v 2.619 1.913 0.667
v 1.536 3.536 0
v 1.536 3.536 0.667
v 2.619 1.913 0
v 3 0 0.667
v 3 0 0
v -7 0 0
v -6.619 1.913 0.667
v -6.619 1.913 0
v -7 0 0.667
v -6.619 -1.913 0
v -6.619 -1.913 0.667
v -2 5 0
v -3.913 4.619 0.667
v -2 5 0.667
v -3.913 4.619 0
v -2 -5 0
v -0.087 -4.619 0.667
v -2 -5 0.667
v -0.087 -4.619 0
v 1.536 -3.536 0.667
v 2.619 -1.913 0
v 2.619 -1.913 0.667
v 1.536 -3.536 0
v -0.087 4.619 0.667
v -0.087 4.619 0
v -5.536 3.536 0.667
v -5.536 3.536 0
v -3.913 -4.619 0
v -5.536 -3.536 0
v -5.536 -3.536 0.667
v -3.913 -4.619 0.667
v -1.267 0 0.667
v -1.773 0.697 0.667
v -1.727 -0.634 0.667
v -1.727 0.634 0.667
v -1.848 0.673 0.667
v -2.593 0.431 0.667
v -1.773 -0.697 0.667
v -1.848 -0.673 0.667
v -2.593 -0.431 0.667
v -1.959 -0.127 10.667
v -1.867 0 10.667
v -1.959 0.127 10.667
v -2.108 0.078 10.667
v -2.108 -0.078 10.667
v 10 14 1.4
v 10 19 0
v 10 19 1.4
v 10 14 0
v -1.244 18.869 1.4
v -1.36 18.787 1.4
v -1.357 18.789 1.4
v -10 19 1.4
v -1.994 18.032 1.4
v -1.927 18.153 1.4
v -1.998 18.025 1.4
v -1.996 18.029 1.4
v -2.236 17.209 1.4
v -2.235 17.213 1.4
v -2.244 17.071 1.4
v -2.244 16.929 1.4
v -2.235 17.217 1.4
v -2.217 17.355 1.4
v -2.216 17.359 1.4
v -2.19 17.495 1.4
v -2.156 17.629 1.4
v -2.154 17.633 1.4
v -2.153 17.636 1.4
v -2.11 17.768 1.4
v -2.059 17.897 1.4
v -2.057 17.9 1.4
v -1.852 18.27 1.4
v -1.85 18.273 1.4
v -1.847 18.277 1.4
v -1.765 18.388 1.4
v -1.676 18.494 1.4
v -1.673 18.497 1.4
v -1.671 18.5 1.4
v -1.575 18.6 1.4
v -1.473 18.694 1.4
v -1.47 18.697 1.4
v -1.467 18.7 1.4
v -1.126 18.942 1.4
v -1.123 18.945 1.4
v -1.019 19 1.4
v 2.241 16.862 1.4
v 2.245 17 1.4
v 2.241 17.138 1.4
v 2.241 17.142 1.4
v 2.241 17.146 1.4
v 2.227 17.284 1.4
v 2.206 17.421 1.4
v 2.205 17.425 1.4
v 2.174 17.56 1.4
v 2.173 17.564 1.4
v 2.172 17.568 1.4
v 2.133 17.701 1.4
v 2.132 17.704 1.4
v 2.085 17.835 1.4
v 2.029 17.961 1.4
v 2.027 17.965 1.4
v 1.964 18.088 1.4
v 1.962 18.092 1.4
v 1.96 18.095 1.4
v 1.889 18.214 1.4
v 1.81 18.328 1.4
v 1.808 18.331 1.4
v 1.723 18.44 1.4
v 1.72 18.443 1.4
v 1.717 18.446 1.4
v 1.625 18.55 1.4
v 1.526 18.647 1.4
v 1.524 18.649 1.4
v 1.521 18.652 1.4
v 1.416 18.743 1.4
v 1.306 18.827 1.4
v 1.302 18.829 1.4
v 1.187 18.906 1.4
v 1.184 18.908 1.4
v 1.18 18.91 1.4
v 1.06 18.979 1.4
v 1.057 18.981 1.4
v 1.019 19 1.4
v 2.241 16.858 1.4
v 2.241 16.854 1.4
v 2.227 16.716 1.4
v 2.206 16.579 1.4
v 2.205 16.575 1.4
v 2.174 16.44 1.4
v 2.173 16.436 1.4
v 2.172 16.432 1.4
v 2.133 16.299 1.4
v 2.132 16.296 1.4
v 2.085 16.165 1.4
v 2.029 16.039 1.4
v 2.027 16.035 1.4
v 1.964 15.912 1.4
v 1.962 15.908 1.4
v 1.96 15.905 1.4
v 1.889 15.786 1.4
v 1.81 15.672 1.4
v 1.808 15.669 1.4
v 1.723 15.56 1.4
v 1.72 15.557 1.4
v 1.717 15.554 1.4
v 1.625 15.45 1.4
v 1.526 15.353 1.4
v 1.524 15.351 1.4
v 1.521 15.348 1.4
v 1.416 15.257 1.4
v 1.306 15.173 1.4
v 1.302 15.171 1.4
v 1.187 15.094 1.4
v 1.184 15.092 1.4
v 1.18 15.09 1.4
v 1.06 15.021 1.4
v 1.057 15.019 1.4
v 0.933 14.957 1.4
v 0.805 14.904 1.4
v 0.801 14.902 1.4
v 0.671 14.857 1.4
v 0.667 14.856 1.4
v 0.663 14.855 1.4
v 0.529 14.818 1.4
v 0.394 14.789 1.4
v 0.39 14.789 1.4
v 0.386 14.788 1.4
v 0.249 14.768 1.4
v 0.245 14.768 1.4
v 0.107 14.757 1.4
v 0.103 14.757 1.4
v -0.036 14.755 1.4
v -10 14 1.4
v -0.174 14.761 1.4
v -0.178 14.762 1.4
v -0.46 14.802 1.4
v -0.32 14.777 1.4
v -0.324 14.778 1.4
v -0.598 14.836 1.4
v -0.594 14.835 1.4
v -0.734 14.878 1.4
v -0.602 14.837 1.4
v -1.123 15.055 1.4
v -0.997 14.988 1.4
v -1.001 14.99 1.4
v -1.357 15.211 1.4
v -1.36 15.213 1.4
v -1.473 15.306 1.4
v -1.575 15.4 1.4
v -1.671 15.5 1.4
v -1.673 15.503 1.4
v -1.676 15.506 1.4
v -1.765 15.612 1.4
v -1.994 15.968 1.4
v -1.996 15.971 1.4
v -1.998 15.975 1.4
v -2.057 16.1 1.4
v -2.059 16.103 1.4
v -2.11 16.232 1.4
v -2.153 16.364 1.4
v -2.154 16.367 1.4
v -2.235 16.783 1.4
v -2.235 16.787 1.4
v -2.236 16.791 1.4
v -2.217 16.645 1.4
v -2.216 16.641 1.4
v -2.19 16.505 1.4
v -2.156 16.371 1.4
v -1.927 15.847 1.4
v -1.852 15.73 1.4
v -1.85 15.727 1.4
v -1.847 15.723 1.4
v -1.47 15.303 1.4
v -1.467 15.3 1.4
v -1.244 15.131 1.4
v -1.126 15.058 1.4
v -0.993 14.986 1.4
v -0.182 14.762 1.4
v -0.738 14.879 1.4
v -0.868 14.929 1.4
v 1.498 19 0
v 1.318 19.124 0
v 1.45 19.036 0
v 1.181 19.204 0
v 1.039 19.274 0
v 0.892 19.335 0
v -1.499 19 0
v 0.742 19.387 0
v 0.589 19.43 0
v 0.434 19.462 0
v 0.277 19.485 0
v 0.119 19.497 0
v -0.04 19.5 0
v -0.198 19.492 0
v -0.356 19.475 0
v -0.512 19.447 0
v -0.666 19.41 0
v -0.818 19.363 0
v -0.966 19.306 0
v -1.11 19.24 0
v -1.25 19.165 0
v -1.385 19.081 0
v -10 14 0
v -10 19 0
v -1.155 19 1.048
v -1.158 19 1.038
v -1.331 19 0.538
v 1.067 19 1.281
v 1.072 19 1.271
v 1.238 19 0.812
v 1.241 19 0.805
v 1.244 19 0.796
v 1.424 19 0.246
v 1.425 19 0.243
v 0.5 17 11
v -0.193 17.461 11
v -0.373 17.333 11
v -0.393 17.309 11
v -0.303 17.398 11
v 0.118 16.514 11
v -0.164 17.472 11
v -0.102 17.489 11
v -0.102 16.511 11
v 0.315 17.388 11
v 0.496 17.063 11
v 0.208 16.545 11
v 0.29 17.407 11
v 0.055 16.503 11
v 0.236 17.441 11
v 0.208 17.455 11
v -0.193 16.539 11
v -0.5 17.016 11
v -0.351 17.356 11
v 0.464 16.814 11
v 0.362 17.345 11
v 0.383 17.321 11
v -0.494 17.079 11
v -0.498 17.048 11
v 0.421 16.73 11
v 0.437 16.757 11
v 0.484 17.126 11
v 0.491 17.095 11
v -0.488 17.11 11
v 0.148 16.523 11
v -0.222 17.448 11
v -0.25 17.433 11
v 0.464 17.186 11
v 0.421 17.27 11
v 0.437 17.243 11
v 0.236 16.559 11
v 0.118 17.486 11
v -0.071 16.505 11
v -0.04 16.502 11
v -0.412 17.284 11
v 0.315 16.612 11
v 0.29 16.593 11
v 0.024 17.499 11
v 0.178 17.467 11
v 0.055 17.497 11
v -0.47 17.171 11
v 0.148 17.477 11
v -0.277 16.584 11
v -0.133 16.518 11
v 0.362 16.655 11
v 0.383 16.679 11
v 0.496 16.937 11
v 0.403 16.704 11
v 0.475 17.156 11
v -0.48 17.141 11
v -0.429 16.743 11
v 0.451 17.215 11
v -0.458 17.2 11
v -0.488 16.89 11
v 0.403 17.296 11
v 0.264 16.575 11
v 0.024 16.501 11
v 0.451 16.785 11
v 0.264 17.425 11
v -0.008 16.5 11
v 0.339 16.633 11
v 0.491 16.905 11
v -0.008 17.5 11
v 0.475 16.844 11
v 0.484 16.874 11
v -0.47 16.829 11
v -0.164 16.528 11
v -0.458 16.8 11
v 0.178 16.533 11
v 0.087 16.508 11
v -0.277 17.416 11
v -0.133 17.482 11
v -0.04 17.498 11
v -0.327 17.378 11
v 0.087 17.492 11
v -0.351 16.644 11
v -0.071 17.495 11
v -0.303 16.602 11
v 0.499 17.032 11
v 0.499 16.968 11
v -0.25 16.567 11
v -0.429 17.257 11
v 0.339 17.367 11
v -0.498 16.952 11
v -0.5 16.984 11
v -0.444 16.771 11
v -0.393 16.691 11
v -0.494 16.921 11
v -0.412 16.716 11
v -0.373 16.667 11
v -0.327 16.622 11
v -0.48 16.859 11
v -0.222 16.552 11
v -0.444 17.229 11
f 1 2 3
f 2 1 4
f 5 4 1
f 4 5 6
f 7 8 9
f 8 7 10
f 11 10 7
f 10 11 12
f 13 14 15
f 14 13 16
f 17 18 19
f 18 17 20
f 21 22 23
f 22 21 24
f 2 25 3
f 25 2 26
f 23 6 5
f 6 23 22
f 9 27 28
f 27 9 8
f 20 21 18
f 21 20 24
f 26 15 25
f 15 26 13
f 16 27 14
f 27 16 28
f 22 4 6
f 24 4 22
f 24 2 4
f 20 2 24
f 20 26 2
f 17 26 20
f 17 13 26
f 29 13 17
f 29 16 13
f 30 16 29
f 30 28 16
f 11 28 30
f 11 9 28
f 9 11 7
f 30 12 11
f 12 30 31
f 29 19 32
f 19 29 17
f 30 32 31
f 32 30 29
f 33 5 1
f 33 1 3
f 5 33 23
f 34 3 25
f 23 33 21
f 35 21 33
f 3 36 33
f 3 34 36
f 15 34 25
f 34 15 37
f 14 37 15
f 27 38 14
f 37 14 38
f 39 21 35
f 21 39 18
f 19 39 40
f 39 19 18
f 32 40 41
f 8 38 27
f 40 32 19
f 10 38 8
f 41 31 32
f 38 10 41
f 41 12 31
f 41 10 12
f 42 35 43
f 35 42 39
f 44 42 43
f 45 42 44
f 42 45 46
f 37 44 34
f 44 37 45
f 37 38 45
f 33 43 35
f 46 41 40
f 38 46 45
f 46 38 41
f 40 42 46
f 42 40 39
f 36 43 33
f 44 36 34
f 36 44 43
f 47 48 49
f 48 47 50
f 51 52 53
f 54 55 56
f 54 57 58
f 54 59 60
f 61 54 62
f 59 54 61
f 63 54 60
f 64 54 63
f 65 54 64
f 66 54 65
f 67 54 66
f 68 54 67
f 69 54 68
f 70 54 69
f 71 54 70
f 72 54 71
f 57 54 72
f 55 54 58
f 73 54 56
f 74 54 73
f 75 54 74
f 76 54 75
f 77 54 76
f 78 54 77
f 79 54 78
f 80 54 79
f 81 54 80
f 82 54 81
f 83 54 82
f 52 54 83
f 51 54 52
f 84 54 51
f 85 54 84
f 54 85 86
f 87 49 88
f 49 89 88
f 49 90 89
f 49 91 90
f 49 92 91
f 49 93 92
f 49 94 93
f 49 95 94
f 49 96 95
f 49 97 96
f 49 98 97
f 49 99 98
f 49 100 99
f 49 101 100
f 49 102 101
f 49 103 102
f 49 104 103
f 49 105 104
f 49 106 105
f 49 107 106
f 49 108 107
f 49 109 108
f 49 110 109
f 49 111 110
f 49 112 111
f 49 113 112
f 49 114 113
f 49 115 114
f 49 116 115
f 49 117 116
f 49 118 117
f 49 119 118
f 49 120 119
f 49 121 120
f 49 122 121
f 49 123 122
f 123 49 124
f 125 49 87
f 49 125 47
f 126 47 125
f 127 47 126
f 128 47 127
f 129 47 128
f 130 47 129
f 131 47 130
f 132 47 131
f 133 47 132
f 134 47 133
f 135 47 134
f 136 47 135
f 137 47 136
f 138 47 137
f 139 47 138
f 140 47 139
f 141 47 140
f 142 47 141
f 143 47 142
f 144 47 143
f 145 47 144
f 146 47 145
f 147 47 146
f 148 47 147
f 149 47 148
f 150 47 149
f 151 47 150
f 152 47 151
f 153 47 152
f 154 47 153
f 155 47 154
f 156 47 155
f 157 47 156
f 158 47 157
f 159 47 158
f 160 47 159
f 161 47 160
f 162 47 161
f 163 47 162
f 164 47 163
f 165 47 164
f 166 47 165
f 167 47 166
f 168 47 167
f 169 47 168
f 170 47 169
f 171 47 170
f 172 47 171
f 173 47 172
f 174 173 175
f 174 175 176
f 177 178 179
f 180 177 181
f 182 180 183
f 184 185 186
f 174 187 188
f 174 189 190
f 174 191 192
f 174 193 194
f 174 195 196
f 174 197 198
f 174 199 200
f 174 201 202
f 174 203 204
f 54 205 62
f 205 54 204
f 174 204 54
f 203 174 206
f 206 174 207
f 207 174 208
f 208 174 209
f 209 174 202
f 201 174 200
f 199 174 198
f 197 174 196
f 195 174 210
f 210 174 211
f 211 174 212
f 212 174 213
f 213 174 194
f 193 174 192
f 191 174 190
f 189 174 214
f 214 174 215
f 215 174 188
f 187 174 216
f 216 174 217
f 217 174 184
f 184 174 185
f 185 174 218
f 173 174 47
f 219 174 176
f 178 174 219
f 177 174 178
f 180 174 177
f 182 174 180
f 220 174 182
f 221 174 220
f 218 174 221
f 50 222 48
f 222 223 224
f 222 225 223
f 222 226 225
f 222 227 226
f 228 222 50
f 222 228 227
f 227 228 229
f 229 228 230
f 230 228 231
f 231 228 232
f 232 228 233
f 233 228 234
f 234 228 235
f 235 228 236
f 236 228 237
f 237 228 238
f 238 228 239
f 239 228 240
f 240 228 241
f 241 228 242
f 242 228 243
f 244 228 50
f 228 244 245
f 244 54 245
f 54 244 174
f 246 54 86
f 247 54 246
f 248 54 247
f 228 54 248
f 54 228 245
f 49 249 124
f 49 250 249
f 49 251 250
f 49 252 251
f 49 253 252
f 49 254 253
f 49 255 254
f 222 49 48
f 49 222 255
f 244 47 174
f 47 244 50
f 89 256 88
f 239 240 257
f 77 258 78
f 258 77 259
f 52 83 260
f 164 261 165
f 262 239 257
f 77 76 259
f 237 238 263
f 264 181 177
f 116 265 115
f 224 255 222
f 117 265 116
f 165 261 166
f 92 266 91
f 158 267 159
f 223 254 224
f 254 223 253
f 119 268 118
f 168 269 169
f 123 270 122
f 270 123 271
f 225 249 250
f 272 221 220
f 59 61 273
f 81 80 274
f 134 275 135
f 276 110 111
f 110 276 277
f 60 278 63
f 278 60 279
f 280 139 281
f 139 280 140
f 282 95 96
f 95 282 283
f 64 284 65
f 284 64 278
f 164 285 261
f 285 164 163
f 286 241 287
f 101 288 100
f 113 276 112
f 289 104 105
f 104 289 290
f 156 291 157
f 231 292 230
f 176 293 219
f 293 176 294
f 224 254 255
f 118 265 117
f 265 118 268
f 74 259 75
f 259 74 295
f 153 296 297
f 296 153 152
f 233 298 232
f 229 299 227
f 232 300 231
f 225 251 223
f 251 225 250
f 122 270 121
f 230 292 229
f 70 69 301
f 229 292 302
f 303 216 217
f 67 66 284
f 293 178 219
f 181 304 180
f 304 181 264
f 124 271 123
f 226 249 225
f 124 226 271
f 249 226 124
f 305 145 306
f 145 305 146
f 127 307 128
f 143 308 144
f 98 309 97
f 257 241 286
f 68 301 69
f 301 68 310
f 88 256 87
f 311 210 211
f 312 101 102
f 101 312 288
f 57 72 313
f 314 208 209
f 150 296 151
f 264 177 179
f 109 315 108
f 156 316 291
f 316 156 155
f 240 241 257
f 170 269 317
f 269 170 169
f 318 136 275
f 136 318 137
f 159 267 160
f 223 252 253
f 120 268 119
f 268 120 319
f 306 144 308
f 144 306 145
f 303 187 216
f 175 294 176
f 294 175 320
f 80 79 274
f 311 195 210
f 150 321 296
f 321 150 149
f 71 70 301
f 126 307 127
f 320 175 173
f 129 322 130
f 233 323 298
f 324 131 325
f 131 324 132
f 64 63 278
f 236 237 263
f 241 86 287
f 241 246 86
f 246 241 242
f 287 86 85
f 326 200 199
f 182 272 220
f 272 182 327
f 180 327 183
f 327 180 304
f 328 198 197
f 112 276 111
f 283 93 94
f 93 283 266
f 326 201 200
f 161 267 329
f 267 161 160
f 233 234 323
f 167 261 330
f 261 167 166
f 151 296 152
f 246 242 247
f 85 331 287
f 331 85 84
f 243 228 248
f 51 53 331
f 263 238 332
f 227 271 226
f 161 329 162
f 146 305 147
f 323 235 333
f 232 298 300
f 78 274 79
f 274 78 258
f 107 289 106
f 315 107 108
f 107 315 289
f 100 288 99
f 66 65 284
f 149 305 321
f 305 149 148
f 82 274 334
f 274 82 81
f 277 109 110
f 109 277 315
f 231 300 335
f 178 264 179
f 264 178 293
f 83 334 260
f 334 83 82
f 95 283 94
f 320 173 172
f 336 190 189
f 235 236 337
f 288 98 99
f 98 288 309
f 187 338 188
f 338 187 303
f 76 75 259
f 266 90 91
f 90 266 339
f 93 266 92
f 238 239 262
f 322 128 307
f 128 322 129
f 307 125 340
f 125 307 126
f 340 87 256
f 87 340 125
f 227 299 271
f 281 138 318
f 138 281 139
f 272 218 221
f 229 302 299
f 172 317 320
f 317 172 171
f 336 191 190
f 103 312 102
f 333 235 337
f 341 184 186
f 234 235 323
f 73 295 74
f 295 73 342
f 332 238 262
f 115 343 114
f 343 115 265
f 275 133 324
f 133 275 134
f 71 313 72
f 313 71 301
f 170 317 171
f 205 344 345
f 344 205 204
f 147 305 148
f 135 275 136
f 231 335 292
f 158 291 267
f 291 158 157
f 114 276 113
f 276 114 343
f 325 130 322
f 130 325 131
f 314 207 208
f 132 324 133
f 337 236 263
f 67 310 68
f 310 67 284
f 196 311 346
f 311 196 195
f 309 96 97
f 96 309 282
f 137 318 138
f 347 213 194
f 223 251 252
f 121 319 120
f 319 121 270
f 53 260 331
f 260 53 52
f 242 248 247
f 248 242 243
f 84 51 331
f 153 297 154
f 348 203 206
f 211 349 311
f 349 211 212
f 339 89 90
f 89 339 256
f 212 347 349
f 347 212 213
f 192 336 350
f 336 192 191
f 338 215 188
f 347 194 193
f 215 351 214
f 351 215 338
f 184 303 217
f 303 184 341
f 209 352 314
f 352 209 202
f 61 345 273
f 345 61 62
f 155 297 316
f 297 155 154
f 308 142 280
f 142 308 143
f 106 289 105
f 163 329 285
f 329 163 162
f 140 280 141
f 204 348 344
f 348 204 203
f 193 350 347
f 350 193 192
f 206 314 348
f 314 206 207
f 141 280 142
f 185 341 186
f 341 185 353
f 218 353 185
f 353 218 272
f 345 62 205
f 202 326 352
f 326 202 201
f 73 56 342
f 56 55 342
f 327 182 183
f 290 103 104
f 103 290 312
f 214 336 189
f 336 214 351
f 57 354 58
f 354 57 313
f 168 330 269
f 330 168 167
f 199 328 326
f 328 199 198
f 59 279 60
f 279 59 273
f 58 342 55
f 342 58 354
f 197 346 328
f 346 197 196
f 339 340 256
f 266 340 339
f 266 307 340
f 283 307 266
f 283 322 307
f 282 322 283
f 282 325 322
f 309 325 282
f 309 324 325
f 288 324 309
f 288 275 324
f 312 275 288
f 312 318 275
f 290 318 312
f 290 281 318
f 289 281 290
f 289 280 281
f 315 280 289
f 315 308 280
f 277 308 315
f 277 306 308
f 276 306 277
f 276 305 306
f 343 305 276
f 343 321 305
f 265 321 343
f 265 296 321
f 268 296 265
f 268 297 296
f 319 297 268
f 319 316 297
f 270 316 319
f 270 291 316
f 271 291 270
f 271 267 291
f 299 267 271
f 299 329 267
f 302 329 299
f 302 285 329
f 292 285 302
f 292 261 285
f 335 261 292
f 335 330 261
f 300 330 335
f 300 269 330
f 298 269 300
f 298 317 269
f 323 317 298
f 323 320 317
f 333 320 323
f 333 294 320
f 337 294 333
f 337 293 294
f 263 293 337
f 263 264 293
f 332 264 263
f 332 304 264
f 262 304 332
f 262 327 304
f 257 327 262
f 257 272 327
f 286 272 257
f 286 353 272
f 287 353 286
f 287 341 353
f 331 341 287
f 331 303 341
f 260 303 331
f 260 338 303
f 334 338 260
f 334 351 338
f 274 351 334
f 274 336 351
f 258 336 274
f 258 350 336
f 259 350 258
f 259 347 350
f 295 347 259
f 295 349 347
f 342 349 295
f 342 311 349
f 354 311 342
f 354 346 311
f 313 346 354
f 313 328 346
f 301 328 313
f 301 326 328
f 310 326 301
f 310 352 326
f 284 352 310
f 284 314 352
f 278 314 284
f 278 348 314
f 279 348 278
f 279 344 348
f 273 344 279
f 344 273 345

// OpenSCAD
wallThick = 2;  //sets width of wall at base
cutterMinimum = .2;  //sets width of wall at top
baseHeight = 2;
height = 10;
flangeWidth = 5;

//translate([-22,-275,0])
translate([-2,0,0])union(){
    minkowski(){
    outline();
    cylinder(r1 = wallThick/3, r2 = cutterMinimum/3, h = height);
    };
//%cube([.5, .5, height*3], true);
    
    flange();
    
    }
    translate([-10,14,0])cube([20,5,baseHeight*.7]);
    translate([0,17,0])cylinder($fn=99,d1=5,d2=1,h=height*1.1);

module flange(){
	difference(){
	minkowski(){
	baseShape(baseHeight/3);
	cylinder(r = flangeWidth, h = baseHeight/3);
	}
	translate([0,0,-0.01])baseShape(baseHeight*1.1);
	};
}



module outline(){
	difference(){
	minkowski(){
	baseShape(baseHeight/3);
	cylinder(r = cutterMinimum/3, h = baseHeight/3);
	}
	translate([0,0,-0.01])baseShape(baseHeight*1.1);
	};
};

module baseShape(H){
linear_extrude(height=H)
import("ankh-no-hole.dxf");
}
